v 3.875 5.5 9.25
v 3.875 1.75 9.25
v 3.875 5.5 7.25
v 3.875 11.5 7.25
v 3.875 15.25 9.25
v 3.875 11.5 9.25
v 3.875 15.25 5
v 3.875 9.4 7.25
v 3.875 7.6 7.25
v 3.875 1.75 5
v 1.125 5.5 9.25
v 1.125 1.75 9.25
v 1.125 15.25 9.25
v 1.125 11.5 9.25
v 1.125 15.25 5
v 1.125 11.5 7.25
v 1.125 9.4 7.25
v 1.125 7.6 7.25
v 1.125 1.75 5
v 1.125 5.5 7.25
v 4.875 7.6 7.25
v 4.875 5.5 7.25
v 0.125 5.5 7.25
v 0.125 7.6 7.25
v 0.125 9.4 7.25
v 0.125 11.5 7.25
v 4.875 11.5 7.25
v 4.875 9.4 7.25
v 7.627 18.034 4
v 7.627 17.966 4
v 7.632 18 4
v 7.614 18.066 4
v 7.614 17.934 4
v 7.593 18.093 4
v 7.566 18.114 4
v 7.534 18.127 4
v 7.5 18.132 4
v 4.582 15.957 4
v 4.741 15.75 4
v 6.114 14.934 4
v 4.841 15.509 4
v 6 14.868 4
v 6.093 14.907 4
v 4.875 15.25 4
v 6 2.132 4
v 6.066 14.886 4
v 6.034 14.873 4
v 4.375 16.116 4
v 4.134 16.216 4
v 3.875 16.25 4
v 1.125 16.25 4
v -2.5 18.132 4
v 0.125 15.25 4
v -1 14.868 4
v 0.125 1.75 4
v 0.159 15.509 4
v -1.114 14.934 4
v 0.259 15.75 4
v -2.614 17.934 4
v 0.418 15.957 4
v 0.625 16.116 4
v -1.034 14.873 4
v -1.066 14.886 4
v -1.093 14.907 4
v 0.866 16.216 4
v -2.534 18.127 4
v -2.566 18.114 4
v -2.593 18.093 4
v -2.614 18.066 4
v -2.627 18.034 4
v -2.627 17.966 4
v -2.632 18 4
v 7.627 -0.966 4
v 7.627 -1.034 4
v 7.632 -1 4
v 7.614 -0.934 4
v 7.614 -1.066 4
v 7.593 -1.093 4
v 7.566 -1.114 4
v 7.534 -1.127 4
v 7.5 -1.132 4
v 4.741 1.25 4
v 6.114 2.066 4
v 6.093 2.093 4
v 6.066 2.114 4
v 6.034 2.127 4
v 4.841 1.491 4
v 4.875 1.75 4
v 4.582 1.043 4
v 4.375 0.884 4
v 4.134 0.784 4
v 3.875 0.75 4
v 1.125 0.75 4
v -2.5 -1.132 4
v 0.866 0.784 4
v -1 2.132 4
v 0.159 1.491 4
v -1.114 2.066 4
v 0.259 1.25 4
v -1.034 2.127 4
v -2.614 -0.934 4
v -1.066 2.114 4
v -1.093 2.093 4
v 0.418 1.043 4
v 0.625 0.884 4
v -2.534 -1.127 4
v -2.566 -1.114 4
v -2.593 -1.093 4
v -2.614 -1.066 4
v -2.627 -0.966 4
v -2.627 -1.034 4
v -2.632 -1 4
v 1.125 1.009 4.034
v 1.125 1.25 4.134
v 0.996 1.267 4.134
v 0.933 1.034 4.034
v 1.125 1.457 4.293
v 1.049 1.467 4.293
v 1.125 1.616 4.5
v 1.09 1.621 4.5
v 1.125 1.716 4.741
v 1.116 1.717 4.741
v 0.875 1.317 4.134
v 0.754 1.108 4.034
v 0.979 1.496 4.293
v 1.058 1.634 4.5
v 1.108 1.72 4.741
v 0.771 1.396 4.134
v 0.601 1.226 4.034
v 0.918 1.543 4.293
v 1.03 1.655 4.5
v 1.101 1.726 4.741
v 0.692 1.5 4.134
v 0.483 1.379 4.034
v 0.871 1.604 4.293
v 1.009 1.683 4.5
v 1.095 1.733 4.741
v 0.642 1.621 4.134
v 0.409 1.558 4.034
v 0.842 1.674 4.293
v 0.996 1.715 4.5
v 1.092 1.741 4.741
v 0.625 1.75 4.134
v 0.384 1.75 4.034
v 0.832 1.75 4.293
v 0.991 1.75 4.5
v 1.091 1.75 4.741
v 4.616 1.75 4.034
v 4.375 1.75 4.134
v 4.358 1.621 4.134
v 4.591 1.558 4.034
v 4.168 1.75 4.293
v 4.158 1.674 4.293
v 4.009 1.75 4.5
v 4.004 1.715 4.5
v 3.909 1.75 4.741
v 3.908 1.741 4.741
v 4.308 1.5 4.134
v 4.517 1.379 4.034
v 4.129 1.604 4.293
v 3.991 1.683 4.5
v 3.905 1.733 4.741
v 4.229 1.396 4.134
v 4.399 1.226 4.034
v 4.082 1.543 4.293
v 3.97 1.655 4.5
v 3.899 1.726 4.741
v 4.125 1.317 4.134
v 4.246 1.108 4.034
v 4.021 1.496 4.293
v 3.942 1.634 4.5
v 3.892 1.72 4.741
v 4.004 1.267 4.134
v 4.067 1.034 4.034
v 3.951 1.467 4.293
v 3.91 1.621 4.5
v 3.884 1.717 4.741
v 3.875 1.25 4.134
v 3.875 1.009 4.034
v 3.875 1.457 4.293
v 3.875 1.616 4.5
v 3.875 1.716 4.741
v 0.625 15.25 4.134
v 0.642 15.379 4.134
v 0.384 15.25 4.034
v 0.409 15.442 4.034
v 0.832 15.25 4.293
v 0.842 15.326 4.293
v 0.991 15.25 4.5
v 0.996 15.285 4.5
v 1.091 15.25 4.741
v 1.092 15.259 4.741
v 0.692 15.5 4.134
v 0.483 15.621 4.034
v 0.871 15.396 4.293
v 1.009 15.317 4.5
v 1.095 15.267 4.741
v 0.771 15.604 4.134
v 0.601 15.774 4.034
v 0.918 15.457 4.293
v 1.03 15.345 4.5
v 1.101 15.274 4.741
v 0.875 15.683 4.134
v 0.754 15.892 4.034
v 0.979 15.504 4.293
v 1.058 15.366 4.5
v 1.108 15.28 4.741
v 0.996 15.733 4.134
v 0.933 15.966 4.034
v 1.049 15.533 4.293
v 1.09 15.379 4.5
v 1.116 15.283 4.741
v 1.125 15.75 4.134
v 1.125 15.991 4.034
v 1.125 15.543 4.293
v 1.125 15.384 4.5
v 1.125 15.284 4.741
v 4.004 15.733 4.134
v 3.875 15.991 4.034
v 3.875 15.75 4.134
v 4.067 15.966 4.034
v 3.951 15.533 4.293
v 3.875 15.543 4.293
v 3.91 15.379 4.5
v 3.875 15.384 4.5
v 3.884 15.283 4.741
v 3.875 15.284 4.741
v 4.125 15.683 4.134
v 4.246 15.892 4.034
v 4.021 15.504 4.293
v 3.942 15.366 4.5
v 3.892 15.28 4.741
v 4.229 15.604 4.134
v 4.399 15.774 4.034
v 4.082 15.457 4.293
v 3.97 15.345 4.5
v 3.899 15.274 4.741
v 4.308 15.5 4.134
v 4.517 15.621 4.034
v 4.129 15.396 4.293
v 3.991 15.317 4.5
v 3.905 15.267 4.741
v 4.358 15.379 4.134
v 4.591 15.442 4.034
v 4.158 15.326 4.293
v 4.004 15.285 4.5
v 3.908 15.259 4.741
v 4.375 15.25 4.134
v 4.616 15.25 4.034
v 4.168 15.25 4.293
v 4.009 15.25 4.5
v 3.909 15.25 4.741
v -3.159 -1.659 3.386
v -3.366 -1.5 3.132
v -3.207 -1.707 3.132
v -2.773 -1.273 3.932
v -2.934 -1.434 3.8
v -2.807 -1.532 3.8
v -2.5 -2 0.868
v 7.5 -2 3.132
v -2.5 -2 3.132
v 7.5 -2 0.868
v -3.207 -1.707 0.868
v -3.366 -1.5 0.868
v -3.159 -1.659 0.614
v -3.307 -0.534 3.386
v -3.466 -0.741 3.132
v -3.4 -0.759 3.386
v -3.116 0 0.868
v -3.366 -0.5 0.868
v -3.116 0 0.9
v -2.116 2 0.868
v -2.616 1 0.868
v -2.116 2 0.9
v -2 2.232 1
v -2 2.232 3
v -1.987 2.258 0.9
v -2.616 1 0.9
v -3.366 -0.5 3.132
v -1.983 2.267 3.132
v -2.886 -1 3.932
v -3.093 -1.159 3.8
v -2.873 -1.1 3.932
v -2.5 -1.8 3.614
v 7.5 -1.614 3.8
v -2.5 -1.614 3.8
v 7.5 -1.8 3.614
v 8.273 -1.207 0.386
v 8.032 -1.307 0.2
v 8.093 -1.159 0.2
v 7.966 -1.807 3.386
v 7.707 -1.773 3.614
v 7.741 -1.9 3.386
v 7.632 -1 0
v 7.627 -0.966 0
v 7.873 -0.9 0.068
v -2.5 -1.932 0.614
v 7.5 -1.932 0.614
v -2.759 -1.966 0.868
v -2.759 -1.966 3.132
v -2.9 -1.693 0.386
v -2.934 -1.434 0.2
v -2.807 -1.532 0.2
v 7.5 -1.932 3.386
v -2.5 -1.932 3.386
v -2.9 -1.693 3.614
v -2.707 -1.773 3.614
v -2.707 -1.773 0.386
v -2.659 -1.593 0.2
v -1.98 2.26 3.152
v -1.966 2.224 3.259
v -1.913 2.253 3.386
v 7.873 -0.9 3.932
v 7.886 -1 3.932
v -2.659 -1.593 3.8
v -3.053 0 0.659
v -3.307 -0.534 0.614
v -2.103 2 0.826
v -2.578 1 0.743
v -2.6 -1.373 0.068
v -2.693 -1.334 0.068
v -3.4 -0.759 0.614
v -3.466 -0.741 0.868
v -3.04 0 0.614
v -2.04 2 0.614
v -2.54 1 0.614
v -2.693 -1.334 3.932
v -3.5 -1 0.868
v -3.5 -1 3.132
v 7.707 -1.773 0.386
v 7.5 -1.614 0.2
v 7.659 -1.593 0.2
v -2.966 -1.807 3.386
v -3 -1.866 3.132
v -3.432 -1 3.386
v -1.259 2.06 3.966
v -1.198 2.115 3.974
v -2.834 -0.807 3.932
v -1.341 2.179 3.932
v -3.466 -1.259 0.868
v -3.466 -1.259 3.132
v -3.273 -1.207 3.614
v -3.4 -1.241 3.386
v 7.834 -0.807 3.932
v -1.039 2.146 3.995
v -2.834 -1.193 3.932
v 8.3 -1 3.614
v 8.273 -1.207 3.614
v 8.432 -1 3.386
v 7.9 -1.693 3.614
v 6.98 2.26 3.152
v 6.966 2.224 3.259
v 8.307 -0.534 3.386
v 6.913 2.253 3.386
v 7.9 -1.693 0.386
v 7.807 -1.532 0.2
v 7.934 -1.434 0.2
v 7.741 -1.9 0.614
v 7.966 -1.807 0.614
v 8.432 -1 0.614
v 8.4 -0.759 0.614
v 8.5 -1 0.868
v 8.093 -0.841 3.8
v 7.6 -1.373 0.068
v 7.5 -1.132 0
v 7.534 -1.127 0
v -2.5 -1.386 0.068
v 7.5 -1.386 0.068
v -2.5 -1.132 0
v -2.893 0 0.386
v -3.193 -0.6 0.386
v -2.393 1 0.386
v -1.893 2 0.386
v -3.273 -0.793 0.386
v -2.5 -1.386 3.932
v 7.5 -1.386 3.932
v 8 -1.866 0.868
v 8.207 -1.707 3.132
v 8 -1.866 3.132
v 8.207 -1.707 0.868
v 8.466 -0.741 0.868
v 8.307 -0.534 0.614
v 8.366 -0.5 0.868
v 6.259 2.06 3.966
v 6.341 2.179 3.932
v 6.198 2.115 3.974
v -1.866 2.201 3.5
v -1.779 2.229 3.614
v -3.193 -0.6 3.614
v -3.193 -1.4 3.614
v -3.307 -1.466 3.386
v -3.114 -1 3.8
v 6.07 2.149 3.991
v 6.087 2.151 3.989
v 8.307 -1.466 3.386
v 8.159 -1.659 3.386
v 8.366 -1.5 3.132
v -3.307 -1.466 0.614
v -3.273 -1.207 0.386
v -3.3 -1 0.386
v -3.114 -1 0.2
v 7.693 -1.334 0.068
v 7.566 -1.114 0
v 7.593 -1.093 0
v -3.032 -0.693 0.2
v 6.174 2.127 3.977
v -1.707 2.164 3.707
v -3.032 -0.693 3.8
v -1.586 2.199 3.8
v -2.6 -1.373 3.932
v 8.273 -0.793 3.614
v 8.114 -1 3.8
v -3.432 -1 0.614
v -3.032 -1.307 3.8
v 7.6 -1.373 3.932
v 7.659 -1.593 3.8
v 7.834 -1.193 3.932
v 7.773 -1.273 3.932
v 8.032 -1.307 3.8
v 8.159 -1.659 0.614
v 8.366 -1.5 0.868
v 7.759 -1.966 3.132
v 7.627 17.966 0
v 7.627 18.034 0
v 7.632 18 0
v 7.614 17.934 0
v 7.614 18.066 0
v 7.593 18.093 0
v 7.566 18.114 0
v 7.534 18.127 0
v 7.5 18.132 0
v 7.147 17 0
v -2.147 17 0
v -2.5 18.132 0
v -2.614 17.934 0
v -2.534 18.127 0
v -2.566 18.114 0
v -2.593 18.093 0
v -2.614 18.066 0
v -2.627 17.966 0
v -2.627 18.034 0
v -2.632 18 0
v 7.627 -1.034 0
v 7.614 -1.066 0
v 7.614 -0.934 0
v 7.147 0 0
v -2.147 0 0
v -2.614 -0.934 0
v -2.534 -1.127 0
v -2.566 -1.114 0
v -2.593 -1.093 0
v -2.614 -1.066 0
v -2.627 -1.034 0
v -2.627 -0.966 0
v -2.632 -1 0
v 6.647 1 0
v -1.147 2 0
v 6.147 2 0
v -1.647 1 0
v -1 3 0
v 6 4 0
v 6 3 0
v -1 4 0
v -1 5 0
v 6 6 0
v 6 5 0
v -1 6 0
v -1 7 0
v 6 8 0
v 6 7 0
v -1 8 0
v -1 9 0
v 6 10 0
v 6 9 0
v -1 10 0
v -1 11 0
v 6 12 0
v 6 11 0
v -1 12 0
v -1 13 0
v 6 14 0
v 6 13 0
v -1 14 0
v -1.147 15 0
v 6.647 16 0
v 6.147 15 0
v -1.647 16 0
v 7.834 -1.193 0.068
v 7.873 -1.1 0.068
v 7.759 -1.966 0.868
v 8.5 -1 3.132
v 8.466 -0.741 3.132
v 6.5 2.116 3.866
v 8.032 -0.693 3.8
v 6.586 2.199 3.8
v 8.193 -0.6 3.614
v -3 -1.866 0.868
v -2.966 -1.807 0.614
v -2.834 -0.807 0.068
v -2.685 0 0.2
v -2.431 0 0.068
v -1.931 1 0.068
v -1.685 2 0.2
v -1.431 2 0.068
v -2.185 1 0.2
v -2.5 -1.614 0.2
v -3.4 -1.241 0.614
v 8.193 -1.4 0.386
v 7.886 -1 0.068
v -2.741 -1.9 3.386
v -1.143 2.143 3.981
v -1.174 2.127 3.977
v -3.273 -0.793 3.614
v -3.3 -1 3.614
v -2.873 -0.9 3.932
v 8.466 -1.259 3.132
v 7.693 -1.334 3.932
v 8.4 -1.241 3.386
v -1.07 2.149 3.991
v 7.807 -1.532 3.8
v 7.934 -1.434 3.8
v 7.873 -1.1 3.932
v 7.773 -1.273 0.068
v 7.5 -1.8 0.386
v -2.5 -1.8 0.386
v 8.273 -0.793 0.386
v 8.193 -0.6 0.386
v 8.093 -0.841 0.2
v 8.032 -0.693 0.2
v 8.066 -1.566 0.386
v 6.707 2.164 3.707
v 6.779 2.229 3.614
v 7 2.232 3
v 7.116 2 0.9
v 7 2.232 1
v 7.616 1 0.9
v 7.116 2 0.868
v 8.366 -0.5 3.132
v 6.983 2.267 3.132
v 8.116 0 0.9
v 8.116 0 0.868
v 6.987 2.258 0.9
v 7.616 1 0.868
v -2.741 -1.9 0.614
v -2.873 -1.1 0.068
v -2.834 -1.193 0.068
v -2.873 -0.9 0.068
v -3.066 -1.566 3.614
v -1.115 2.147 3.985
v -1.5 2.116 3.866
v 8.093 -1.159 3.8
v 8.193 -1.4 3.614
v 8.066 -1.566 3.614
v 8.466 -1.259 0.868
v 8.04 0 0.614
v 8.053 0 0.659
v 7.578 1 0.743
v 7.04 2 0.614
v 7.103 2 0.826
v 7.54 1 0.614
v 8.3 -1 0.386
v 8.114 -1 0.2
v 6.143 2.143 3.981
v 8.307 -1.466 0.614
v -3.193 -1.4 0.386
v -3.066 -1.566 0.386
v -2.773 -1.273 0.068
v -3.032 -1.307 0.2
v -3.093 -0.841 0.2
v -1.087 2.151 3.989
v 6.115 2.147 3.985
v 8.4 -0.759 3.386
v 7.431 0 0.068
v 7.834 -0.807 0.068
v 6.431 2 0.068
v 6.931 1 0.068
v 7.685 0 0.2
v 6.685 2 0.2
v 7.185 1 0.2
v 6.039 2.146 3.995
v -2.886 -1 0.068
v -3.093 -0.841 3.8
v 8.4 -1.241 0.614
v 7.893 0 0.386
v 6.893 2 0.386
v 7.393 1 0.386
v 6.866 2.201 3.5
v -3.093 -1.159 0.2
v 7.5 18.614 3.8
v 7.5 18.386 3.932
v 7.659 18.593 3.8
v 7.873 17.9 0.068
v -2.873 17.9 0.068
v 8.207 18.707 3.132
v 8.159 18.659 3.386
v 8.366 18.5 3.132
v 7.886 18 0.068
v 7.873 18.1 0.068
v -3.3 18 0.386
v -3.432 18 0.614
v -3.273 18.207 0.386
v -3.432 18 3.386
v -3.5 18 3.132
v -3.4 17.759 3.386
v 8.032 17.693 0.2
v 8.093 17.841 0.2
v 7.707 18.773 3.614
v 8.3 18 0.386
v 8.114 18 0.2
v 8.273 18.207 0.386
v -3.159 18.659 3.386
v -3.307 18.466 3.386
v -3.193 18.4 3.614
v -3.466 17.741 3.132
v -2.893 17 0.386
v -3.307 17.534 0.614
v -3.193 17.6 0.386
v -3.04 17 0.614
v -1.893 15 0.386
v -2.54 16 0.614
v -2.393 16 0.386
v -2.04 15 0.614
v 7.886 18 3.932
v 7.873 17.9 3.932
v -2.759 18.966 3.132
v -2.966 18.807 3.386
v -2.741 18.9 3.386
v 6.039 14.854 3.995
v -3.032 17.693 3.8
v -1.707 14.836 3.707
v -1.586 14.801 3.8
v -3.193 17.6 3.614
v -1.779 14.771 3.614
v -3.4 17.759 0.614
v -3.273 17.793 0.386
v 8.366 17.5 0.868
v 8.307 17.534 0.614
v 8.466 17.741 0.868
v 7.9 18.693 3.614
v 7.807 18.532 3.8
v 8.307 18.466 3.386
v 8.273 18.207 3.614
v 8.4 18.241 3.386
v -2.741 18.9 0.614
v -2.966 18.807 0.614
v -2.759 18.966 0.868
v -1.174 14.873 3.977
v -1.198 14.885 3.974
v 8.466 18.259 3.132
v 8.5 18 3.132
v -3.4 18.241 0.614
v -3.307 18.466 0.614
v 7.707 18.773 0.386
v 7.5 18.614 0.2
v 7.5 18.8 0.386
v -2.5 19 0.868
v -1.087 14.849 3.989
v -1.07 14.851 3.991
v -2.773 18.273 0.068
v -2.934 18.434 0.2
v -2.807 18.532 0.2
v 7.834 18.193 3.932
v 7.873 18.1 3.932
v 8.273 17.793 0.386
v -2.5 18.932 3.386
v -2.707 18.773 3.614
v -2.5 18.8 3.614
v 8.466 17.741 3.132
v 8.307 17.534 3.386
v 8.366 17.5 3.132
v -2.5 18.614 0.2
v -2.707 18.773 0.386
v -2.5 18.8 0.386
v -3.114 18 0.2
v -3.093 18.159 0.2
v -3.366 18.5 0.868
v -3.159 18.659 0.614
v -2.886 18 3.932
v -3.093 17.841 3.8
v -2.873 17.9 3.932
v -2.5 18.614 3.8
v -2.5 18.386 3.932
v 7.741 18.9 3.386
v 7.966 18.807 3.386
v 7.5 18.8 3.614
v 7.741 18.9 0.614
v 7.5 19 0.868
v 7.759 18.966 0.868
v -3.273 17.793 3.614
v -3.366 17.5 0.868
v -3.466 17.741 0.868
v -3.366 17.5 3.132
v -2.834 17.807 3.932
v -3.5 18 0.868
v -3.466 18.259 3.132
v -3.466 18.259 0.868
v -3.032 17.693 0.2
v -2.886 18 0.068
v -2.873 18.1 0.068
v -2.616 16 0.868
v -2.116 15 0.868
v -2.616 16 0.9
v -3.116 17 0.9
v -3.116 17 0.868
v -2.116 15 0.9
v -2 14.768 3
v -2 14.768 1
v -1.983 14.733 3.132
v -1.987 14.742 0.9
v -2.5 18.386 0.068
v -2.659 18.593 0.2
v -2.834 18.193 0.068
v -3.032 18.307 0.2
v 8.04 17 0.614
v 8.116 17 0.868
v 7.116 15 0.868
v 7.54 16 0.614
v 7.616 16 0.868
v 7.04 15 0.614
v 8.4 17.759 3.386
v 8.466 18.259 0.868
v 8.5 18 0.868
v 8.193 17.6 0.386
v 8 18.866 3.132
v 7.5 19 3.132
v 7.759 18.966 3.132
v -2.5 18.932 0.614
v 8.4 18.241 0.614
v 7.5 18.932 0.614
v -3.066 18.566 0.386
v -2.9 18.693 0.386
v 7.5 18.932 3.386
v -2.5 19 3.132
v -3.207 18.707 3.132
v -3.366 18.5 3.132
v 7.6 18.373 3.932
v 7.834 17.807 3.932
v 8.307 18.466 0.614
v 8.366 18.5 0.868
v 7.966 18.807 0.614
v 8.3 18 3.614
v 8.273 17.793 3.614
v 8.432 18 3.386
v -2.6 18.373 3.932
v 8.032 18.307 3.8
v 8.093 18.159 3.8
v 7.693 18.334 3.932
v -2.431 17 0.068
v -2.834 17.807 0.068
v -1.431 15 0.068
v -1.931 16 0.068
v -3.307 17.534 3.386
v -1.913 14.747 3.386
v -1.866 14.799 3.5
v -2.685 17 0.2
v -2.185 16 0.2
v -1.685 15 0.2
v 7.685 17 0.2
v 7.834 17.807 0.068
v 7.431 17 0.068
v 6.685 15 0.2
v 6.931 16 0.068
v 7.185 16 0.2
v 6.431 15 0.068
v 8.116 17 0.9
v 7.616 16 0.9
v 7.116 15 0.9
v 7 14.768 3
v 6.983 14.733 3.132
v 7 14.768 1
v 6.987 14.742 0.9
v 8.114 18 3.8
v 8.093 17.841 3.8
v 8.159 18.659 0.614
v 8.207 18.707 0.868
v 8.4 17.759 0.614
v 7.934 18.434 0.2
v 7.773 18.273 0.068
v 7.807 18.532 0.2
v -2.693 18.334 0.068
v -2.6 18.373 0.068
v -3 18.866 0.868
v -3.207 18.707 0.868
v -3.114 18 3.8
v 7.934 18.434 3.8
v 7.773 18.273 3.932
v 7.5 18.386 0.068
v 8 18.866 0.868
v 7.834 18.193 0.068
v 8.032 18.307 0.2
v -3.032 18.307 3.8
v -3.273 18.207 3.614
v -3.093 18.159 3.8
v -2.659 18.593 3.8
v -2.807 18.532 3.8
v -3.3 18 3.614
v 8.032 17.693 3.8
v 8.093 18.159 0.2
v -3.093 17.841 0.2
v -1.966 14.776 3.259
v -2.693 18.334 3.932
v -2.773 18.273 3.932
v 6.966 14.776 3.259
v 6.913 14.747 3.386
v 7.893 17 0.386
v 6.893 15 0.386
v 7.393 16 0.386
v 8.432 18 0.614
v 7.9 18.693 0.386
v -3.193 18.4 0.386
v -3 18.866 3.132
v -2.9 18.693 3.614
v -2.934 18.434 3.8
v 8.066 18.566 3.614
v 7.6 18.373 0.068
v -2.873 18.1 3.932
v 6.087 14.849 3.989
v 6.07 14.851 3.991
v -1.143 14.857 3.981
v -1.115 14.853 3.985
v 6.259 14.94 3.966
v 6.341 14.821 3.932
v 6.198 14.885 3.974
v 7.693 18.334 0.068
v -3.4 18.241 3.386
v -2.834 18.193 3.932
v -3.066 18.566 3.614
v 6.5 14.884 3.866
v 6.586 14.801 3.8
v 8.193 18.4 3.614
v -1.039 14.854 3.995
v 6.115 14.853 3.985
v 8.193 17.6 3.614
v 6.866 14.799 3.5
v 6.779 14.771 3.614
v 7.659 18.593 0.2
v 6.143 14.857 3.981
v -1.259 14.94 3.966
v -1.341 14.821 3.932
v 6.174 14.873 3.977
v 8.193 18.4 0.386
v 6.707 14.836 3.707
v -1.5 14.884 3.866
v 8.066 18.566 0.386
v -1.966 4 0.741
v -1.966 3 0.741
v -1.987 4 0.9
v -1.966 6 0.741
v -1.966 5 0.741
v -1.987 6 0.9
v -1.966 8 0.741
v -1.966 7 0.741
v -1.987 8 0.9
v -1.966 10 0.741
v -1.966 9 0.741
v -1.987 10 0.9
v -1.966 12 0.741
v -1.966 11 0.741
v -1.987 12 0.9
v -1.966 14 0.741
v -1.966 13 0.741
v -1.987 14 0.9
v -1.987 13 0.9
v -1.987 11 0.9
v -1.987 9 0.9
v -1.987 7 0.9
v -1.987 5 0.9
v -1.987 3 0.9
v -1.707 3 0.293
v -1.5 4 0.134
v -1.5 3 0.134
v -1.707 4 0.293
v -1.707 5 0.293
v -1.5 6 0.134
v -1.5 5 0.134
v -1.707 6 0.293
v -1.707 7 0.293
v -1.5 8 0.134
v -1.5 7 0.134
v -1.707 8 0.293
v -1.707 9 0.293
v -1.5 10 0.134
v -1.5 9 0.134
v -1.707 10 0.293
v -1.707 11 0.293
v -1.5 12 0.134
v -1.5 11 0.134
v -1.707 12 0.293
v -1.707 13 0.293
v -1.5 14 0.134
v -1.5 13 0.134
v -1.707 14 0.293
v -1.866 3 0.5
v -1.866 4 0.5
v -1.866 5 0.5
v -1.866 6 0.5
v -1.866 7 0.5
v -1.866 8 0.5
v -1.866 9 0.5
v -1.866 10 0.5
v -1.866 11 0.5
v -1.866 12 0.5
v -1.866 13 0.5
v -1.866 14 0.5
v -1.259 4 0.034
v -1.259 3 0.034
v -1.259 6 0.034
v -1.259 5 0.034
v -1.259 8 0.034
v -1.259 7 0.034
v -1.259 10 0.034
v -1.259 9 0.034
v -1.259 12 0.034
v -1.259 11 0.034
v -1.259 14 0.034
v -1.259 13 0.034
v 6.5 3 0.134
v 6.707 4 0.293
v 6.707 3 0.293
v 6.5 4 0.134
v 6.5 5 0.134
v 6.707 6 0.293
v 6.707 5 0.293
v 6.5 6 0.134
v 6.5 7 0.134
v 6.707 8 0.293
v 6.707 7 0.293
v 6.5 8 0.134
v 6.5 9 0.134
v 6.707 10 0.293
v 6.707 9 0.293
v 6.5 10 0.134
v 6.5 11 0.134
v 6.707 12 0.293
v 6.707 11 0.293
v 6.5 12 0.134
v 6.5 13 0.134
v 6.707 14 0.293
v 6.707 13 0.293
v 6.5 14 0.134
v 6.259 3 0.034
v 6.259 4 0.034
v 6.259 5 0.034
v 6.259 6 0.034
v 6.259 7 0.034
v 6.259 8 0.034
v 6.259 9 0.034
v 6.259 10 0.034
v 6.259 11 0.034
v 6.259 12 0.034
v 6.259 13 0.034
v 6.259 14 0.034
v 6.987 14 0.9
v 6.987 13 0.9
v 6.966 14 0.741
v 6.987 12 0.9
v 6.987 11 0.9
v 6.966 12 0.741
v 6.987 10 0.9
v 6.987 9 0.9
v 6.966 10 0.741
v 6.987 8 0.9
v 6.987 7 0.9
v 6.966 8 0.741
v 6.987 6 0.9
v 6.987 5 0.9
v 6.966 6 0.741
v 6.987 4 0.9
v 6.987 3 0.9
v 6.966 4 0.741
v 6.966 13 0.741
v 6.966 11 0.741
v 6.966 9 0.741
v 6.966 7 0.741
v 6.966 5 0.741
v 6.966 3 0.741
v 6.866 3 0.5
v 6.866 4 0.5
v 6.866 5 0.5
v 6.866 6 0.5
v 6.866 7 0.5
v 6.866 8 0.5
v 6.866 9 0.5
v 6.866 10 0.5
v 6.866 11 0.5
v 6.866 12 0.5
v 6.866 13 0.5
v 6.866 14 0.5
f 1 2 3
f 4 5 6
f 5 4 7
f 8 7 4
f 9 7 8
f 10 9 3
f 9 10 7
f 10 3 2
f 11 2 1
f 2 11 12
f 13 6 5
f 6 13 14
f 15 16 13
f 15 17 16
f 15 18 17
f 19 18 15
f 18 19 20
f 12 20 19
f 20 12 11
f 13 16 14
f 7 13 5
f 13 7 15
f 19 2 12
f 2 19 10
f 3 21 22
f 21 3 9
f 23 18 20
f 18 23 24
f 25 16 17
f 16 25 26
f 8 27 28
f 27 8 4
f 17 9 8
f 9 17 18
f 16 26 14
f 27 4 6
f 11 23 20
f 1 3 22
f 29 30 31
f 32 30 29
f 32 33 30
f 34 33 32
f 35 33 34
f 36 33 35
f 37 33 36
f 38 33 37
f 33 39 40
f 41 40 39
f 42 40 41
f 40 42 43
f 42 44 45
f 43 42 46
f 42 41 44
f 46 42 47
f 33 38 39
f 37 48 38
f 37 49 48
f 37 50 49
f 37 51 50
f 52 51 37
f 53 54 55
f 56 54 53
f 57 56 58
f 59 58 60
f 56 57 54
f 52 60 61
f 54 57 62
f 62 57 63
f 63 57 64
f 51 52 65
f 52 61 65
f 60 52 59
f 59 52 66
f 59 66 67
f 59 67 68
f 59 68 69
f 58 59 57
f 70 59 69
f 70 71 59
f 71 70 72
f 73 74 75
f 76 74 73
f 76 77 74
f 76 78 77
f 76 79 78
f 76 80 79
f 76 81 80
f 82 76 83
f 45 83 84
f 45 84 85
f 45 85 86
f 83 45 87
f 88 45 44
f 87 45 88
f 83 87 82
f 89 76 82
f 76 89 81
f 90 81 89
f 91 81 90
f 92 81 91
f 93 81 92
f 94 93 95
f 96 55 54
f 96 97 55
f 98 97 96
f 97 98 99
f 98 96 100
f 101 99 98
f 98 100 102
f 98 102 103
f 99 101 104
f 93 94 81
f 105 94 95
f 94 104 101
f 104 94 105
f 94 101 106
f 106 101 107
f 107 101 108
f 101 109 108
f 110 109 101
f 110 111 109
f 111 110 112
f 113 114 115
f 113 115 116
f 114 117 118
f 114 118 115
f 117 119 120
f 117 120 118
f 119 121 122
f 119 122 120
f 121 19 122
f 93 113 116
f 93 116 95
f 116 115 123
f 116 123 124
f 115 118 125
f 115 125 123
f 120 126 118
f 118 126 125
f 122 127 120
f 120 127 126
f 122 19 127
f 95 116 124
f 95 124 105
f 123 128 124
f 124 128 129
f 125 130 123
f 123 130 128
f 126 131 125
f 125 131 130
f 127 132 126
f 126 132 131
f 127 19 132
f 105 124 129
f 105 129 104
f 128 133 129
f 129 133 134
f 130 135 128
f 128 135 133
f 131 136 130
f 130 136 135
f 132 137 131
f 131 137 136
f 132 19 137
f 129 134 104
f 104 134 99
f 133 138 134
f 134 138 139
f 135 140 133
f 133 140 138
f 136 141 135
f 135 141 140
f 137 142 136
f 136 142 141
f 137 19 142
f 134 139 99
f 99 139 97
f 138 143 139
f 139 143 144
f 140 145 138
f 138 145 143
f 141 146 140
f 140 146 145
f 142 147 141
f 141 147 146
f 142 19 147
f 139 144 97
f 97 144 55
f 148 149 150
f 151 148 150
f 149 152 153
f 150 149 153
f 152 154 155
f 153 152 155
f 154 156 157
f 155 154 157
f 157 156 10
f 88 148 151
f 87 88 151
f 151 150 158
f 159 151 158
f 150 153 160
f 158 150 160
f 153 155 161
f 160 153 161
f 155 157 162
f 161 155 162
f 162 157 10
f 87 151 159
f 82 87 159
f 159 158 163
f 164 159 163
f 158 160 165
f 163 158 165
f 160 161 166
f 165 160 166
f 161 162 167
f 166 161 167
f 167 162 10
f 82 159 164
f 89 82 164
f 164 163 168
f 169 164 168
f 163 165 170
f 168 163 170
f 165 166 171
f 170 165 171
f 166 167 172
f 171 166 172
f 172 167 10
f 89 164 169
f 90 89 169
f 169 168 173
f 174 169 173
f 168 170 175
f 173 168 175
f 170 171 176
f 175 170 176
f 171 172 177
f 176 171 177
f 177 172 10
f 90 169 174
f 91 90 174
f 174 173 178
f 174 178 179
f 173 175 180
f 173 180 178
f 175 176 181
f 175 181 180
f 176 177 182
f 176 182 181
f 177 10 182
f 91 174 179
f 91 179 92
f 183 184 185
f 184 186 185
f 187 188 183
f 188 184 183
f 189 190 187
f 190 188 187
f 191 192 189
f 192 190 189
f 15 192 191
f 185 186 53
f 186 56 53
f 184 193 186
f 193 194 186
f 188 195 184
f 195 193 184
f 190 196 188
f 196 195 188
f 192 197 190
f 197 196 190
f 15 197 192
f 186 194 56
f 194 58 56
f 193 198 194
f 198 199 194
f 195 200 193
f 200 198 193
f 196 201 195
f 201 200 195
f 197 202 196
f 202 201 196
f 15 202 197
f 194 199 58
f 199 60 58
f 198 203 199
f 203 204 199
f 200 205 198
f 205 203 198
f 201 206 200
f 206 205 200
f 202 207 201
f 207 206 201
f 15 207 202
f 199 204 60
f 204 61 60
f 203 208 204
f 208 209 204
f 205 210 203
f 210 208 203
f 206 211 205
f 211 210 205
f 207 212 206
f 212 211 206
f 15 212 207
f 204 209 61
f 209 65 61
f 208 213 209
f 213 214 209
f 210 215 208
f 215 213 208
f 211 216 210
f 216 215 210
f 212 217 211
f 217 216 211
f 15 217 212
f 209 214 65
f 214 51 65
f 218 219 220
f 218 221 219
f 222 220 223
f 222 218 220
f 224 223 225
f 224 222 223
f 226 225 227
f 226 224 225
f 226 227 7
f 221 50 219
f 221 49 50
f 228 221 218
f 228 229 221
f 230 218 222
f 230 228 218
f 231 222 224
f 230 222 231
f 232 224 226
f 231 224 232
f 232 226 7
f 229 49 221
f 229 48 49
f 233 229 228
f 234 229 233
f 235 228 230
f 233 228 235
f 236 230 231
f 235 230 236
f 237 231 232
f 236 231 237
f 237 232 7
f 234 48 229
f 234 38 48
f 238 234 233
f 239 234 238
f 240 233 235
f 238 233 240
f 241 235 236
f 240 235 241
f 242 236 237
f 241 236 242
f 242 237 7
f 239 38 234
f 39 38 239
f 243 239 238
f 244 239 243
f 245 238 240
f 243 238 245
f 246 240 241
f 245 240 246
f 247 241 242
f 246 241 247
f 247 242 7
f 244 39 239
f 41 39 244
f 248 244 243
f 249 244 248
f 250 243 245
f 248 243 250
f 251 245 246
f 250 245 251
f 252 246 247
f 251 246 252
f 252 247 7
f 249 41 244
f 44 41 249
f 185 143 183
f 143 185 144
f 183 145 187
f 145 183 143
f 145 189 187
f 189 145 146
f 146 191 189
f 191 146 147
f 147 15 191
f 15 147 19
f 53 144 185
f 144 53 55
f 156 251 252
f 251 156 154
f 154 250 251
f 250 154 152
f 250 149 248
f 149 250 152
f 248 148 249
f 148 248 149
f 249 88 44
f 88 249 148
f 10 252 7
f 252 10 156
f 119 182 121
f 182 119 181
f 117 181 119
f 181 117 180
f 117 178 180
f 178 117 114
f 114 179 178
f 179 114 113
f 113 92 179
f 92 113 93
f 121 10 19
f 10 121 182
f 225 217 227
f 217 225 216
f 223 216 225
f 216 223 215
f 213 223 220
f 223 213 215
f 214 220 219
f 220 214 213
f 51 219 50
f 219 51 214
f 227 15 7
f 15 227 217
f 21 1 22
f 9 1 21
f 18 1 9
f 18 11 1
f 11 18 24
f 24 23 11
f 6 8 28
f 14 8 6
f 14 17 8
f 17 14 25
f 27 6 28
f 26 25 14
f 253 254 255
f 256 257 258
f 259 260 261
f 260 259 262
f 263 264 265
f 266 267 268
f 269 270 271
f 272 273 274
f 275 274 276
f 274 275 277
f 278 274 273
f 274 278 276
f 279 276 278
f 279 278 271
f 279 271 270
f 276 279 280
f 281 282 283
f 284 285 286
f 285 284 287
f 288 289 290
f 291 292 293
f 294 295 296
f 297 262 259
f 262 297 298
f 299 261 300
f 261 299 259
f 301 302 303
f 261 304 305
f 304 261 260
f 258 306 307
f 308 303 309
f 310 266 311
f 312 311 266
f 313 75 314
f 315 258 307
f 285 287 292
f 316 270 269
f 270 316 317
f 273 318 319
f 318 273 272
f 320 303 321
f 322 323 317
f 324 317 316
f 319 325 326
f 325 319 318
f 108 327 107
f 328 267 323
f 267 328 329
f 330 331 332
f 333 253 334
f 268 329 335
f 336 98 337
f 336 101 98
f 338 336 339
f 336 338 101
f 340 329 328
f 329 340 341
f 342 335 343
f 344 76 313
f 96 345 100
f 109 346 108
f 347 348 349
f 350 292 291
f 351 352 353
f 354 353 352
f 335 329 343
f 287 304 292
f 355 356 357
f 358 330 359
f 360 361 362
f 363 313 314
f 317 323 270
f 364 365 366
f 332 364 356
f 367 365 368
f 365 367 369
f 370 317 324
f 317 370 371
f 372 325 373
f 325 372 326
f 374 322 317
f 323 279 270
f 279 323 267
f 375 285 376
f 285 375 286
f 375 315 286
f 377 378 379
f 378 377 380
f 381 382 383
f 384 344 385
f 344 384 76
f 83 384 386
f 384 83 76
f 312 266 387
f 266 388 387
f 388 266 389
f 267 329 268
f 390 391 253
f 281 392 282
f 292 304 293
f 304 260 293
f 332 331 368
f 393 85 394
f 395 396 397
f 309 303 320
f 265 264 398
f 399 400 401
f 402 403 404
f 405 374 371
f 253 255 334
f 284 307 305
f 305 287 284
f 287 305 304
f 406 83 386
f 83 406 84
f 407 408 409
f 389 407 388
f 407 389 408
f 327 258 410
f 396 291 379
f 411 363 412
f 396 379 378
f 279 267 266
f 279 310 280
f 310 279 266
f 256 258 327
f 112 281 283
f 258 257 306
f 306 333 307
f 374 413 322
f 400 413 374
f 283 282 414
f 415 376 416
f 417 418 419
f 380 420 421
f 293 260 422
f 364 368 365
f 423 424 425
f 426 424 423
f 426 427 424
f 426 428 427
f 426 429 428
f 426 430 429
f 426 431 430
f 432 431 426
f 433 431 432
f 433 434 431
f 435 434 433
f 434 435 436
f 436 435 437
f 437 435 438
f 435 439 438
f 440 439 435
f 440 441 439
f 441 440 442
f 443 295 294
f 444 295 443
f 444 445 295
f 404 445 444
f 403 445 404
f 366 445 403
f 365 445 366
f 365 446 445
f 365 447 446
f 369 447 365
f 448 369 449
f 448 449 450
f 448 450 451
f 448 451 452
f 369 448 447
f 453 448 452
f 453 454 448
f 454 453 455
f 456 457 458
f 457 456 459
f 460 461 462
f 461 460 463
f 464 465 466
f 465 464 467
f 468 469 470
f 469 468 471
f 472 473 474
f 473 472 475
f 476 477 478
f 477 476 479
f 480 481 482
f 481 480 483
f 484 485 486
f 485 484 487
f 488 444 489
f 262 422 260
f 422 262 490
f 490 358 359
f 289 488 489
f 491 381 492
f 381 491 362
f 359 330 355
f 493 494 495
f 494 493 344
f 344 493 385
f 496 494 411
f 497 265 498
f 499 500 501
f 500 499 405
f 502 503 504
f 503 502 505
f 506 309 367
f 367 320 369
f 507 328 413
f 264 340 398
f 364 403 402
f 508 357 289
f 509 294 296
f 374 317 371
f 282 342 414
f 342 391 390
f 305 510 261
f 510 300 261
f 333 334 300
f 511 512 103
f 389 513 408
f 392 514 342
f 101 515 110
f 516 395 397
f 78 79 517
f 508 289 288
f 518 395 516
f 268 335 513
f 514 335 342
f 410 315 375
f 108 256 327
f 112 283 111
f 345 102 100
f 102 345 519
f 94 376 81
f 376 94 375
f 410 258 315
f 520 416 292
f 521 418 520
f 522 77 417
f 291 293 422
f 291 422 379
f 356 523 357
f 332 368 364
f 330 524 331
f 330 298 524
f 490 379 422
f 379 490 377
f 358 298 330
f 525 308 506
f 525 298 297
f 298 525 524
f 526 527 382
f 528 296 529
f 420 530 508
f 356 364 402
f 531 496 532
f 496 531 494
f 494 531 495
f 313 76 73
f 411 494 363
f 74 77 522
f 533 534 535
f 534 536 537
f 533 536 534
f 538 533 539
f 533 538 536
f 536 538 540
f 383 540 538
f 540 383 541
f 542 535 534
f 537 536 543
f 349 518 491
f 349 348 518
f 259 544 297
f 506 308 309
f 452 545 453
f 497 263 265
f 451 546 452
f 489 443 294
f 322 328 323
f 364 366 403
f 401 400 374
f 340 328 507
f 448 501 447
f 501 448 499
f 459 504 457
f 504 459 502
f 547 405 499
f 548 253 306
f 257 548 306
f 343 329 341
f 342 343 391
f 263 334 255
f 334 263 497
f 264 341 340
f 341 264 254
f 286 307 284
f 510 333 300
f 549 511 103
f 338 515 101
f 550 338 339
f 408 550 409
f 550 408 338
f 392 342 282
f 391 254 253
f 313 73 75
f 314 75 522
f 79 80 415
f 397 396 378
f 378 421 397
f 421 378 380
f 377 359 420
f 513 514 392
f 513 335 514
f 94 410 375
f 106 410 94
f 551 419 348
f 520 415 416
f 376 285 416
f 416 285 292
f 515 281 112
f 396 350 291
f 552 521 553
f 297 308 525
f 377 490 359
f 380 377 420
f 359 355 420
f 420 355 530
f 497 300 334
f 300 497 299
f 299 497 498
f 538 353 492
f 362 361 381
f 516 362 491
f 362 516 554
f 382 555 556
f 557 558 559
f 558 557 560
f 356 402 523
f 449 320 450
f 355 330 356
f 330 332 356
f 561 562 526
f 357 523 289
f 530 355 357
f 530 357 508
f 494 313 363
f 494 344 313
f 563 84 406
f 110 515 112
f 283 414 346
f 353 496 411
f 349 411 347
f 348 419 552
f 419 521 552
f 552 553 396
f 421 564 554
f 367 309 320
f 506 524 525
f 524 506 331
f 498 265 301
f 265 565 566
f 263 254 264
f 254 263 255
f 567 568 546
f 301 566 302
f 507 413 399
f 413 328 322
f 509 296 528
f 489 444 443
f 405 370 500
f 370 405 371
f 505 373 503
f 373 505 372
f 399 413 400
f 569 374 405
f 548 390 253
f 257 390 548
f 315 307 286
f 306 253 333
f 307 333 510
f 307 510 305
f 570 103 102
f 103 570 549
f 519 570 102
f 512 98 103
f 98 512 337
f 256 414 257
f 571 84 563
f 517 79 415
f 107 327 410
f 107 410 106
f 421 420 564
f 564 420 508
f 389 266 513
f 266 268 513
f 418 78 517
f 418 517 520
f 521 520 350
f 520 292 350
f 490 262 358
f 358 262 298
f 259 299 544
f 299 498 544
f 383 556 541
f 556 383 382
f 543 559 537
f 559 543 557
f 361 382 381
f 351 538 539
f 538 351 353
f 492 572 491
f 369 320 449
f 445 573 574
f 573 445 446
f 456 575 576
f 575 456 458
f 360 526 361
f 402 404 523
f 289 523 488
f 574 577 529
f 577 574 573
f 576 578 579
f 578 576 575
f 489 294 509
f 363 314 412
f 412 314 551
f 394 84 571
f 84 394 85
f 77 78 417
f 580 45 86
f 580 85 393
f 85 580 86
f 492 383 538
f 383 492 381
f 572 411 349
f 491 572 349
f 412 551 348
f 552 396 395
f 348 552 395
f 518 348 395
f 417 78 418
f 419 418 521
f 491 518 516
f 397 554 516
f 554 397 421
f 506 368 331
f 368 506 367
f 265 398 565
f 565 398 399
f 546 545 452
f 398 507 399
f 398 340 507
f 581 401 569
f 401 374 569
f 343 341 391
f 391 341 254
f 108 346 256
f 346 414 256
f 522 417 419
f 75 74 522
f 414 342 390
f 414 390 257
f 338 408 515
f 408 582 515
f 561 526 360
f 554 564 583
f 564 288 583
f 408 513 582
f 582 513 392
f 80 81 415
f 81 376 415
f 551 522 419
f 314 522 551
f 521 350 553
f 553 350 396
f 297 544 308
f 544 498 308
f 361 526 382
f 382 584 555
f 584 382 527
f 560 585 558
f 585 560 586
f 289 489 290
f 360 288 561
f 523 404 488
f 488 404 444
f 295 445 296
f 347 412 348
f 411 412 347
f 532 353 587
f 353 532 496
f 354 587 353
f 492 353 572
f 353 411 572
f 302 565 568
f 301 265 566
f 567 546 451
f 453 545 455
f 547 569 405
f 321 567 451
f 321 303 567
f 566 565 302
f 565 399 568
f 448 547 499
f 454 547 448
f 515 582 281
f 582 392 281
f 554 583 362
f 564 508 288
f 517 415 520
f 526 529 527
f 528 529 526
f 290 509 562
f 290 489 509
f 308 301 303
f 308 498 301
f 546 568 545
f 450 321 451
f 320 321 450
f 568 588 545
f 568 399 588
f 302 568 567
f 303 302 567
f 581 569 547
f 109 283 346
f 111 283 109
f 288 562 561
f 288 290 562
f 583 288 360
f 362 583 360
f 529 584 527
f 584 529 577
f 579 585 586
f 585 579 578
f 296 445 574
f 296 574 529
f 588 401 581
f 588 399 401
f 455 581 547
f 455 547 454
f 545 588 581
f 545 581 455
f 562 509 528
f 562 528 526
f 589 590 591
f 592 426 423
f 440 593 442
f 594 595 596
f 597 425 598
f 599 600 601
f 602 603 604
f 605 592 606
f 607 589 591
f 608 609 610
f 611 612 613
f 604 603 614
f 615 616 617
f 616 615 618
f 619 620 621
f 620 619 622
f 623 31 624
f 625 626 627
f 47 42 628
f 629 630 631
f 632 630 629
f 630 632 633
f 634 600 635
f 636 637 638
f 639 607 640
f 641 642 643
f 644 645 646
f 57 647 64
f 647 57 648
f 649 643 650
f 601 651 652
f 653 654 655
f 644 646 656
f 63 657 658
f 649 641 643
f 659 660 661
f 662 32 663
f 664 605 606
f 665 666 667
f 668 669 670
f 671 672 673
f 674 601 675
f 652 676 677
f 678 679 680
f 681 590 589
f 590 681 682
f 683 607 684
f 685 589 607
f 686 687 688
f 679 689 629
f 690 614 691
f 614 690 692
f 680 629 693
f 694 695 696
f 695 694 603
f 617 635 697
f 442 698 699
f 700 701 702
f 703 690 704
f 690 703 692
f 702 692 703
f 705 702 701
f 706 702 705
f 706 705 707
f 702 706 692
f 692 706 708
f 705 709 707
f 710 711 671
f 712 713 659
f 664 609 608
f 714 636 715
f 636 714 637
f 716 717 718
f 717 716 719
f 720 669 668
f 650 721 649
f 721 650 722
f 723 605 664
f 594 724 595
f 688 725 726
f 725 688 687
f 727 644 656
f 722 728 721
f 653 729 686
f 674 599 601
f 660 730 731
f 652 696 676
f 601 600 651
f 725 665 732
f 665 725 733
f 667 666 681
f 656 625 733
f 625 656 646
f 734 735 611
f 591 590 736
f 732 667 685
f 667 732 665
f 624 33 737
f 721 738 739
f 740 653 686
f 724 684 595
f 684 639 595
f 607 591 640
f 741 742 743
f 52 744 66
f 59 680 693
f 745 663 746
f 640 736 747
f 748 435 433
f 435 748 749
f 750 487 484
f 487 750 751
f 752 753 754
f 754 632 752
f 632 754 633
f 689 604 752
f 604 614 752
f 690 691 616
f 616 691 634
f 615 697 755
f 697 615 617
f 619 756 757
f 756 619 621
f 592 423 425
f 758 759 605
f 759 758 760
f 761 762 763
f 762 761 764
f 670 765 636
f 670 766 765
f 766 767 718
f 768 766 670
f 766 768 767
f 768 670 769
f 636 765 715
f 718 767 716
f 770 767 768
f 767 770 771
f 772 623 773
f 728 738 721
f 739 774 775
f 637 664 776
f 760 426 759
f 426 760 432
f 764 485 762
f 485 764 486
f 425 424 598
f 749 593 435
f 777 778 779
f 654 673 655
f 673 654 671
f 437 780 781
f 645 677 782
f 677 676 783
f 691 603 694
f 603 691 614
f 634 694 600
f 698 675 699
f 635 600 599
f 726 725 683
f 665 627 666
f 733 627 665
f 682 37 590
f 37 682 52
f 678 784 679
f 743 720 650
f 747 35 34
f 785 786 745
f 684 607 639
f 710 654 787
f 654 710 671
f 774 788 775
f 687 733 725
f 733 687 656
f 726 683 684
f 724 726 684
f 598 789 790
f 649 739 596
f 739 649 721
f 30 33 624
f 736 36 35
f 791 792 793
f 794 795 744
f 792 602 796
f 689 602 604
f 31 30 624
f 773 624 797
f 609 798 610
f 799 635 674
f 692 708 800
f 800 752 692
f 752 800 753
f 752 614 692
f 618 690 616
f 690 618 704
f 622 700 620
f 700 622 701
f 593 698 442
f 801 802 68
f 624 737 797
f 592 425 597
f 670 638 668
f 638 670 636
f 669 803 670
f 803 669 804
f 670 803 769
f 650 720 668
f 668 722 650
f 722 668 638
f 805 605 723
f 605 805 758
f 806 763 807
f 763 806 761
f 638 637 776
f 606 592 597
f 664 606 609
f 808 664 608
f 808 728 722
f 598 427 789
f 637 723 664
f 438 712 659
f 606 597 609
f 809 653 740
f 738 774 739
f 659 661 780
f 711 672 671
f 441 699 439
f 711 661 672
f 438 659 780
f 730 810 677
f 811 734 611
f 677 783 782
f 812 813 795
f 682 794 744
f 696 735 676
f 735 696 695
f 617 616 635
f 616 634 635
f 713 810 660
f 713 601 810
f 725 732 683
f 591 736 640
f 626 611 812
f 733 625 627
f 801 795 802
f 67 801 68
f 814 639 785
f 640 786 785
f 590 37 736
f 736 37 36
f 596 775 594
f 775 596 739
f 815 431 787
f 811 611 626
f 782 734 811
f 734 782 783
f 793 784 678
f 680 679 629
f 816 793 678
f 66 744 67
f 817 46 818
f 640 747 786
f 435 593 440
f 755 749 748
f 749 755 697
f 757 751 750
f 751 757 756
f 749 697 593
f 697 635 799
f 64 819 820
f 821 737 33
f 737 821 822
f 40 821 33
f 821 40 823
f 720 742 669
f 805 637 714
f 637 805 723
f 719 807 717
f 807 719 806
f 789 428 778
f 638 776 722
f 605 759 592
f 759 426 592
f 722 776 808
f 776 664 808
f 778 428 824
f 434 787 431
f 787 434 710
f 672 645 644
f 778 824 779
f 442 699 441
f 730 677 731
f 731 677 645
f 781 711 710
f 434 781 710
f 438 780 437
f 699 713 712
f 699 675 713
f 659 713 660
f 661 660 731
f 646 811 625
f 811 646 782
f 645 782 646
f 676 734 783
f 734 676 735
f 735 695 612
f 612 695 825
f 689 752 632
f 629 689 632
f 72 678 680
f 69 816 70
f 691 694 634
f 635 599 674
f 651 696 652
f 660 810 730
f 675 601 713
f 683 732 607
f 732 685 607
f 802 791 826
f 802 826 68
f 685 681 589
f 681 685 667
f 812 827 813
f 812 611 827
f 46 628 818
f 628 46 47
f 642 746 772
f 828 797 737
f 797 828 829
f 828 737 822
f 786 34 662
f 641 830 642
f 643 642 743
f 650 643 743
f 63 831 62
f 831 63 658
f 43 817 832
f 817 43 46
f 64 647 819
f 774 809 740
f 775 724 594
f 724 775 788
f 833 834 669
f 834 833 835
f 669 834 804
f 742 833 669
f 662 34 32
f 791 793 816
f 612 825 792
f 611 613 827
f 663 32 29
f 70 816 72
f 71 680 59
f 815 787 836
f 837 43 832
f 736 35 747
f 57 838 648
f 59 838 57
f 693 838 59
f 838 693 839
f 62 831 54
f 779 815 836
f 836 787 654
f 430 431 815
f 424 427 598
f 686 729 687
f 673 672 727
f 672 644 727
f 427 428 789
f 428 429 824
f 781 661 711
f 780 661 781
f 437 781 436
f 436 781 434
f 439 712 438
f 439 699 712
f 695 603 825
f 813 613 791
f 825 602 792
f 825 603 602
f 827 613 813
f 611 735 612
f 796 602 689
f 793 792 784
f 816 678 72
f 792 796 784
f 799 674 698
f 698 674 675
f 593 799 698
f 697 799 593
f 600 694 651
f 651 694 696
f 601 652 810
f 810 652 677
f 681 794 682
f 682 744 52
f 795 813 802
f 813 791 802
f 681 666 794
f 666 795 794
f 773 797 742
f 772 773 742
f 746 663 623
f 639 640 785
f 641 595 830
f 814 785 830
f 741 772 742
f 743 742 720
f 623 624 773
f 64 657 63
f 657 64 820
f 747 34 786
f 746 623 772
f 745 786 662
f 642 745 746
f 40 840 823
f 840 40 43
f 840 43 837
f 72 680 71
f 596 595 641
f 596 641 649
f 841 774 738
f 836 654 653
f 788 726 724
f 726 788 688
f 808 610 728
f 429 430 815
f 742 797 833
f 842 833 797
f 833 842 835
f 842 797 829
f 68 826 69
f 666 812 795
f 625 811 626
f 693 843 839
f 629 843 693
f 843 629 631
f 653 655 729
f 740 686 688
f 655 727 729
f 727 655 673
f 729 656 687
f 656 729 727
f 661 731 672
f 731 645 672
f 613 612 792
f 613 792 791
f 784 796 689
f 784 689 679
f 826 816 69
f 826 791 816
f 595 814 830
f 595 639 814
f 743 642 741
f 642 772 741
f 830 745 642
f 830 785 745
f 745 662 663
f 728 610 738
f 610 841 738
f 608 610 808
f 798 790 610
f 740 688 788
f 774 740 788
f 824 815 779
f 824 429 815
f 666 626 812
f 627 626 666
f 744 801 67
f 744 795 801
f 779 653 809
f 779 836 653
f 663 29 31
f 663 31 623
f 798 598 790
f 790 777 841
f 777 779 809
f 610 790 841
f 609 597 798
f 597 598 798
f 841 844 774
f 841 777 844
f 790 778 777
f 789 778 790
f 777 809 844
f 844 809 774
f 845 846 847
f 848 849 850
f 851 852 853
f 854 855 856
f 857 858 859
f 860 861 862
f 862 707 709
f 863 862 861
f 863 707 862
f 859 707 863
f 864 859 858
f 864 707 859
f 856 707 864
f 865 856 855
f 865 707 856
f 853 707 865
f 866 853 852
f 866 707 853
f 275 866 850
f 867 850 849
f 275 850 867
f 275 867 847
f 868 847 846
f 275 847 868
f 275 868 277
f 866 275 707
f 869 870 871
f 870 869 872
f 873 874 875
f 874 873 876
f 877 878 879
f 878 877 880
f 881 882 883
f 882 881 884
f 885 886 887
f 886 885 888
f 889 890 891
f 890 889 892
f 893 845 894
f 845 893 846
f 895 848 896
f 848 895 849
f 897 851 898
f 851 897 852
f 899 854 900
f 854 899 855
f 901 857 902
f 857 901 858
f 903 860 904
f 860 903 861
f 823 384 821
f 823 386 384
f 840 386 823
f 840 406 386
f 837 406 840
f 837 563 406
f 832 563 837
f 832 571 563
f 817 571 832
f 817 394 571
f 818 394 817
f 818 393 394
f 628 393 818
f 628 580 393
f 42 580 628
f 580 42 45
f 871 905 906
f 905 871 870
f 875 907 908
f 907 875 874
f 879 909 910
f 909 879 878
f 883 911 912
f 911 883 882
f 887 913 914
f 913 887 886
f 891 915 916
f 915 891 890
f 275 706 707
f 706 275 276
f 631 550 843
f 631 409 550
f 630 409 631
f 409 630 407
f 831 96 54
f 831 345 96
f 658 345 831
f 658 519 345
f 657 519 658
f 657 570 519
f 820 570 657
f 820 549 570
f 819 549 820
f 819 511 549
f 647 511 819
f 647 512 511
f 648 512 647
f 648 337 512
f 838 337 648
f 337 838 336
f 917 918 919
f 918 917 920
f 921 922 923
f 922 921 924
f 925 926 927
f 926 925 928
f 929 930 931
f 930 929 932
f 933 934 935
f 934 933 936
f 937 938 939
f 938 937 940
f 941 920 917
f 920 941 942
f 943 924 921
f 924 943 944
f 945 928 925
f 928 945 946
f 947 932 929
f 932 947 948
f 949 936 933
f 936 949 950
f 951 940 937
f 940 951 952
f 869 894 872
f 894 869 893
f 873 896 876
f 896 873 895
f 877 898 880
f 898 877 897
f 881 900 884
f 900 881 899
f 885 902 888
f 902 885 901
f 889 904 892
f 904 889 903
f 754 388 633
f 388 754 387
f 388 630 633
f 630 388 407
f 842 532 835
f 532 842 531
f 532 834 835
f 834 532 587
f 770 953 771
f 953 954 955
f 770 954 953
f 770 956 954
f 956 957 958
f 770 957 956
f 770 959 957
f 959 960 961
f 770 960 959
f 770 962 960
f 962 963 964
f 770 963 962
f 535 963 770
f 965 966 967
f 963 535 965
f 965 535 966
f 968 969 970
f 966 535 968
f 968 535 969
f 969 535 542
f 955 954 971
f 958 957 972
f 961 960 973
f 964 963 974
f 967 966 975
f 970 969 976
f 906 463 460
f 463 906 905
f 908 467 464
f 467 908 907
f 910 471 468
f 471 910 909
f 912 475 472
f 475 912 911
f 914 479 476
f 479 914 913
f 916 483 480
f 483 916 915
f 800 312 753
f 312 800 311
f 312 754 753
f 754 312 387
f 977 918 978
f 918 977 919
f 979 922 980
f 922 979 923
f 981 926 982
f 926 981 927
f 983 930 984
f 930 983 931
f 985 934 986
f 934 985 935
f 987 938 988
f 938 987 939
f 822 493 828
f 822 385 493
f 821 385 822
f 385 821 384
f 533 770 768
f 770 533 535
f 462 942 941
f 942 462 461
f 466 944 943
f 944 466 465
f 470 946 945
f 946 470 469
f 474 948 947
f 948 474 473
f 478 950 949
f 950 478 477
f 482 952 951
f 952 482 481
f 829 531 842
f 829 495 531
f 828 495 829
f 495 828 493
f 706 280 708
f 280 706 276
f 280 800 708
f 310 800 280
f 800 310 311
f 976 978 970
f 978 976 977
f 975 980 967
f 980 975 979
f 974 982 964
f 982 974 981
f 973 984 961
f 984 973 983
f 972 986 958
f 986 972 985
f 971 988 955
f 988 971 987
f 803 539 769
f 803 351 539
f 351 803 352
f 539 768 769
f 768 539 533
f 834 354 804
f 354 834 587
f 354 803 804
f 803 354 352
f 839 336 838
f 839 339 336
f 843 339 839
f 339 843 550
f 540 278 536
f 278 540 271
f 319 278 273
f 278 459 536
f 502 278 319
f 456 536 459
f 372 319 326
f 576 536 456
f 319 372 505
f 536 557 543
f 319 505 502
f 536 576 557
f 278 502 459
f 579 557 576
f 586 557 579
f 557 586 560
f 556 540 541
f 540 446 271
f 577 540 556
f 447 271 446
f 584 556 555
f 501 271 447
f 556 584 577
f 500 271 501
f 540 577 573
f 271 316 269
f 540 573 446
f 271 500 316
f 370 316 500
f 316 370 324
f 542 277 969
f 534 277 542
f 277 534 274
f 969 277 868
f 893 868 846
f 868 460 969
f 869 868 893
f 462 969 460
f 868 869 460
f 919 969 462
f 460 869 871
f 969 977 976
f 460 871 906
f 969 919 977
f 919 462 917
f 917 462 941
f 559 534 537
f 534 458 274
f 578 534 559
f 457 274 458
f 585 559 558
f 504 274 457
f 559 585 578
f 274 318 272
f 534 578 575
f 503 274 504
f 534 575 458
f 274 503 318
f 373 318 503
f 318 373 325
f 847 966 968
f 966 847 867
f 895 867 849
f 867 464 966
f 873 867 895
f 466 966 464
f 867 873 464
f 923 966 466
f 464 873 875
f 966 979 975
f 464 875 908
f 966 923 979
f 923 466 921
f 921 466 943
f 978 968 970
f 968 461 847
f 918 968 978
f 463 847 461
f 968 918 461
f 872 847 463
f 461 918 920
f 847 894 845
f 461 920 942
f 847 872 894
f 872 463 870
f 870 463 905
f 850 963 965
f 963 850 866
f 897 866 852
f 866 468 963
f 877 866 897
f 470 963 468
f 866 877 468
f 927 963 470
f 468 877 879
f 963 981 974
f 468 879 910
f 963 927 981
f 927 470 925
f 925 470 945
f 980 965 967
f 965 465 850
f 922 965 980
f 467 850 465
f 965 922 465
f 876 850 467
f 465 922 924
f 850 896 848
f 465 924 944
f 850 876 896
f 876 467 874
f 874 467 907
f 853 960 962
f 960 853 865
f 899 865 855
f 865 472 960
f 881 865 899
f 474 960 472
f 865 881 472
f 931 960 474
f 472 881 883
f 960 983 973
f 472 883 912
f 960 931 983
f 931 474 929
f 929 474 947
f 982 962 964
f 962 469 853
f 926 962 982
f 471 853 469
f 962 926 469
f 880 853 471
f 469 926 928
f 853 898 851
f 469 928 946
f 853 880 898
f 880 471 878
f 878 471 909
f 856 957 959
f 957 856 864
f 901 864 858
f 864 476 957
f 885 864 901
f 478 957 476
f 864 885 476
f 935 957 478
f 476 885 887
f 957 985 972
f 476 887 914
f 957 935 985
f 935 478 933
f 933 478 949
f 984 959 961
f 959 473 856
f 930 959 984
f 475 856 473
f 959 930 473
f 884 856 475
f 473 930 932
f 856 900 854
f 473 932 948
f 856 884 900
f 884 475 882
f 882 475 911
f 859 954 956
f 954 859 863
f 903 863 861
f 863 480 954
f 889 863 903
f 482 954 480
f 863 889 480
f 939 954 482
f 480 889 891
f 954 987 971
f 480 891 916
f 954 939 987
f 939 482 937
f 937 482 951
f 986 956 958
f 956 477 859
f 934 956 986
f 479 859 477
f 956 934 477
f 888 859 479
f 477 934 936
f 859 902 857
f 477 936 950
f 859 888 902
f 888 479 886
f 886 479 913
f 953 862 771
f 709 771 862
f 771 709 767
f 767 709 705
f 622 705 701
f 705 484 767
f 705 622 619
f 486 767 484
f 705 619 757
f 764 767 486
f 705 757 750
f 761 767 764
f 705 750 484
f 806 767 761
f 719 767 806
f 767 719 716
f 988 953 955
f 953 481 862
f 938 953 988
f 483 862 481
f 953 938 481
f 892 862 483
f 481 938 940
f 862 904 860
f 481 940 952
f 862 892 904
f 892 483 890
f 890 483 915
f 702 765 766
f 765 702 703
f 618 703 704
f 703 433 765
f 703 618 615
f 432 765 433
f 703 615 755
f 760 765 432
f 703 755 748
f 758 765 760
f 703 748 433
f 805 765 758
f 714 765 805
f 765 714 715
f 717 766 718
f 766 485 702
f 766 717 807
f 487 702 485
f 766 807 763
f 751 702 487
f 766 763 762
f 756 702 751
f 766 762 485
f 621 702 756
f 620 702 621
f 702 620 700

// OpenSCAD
/*
*	olfa-l5-al.scad by cgsnz @ Thingiverse
*
*	Replacement thumbgrip for olfa-l5-al box cutter knife
*
* This work is licensed under the Creative Commons Attribution-ShareAlike 4.0 International License. To view a copy of this license, visit http://creativecommons.org/licenses/by-sa/4.0/ or send a letter to Creative Commons, PO Box 1866, Mountain View, CA 94042, USA.
*
*/

/*[ Main Settings ]*/
// Fragments
$fn=24;//[24:low,48:med,96:high]
// Inner Body Width
TW = 9;//[6:15]
// End Body Width
TW2 = 12;//[6:18]
// Total Length
TL = 17;//[14:30]
// End Body Depth
TE = 3;//[1:10]
// Thickness
TT = 4;//[3:7]
// Groove Depth
TGD = 0.9;
// Groove Width
TGW = 1;
// Center Catch Width - exagerated because of bottom being printed into thin air, real width = 3.6
CCW = 4.75;

// center insert params

IL = 0+13.5;
IW = 0+2.75;
IH = 0+4.25;
CL = 0+6;
CF = 0+1.8;
CD = 0+2;

IH2 = IH+TT/2;
CO = IL-CL;
CFO = CL-CF;
CBO = CCW-IW;
TWO = (TW2-TW)/2;

translate([(TW-TT-IW)/2,(TL-IL)/2,TT*.75]) insert();
difference() {
	thumbgrip();
	groves();
}

module groves() {
	g = floor((TL+TT/4)/TGW);
	w = (g%2)?0:TGW/2;
	o = (TL-g*TGW)/2;
	to = TW2>TW?TWO:0;
	for (i = [0 : 2 : g-1]) {
	 translate([-to-TT/2-.1,w+o+i*TGW,-.1]) cube([max(TW,TW2)+.2,TGW,TGD+.1]);
	}
}

module thumbgrip() {
	tt = TT/cos(180/$fn);
	hull() {
		translate([-TT/4,-TT/4+TE,TT*.75]) sphere(tt/4);
		translate([-TWO-TT/4,-TT/4,TT*.75]) sphere(tt/4);
		translate([(TW-TT)+TT/4,-TT/4+TE,TT*.75]) sphere(tt/4);
		translate([TWO+(TW-TT)+TT/4,-TT/4,TT*.75]) sphere(tt/4);
		translate([-TT/4,-TT/4+TE,TT/4]) sphere(tt/4);
		translate([-TWO-TT/4,-TT/4,TT/4]) sphere(tt/4);
		translate([(TW-TT)+TT/4,-TT/4+TE,TT/4]) sphere(tt/4);
		translate([TWO+(TW-TT)+TT/4,-TT/4,TT/4]) sphere(tt/4);
	}
	hull() {
		translate([-TT/4,TL+TT/4-TE,TT*.75]) sphere(tt/4);
		translate([-TWO-TT/4,TL+TT/4,TT*.75]) sphere(tt/4);
		translate([(TW-TT)+TT/4,TL+TT/4-TE,TT*.75]) sphere(tt/4);
		translate([TWO+(TW-TT)+TT/4,TL+TT/4,TT*.75]) sphere(tt/4);
		translate([-TT/4,TL+TT/4-TE,TT/4]) sphere(tt/4);
		translate([-TWO-TT/4,TL+TT/4,TT/4]) sphere(tt/4);
		translate([(TW-TT)+TT/4,TL+TT/4-TE,TT/4]) sphere(tt/4);
		translate([TWO+(TW-TT)+TT/4,TL+TT/4,TT/4]) sphere(tt/4);
	}
	hull() {
		translate([-TT/4,TE-TT/4,TT/4]) rotate([-90,0,0]) cylinder(h=TL-TE*2+TT/2,r=TT/4);
		translate([-TT/4,TE-TT/4,TT-TT/4]) rotate([-90,0,0]) cylinder(h=TL-TE*2+TT/2,r=TT/4);
		translate([TW-TT*.75,TE-TT/4,TT/4]) rotate([-90,0,0]) cylinder(h=TL-TE*2+TT/2,r=TT/4);
		translate([TW-TT*.75,TE-TT/4,TT-TT/4]) rotate([-90,0,0]) cylinder(h=TL-TE*2+TT/2,r=TT/4);
	}
}

module insert() {
	difference() {
		cube([IW,IL,IH2]);
		translate([-.5,CO/2,IH2-CD]) cube([IW+1,CL,CD+.1]);
	}
	union() {
		translate([0,0,TT/4]) cfillet(TT/4);
		translate([IW,0,TT/4]) cfillet(TT/4);
		translate([0,IL,TT/4]) cfillet(TT/4);
		translate([IW,IL,TT/4]) cfillet(TT/4);
		translate([0,0,TT/4]) rotate([90,0,180]) fillet(TT/4,IL);
		translate([IW,0,TT/4]) rotate([-90,-90,0]) fillet(TT/4,IL);
		translate([0,0,TT/4]) rotate([0,-90,180]) fillet(TT/4,IW);
		translate([IW,IL,TT/4]) rotate([0,-90,0]) fillet(TT/4,IW);
	}
	polyhedron(
  points = [
		[-CBO/2, CO/2, IH2-CD],[IW+CBO/2, CO/2, IH2-CD],
		[0, CO/2, IH2],[IW, CO/2, IH2],
		[-CBO/2, (CO+CFO)/2, IH2-CD],[IW+CBO/2, (CO+CFO)/2, IH2-CD],
  ],
  faces = [[2,3,1,0],[0,4,2],[1,3,5],[3,2,4,5],[0,1,5,4]]);
	polyhedron(
  points = [
		[-CBO/2, IL-CO/2, IH2-CD],[IW+CBO/2, IL-CO/2, IH2-CD],
		[0, IL-CO/2, IH2],[IW, IL-CO/2, IH2],
		[-CBO/2, IL-(CO+CFO)/2, IH2-CD],[IW+CBO/2, IL-(CO+CFO)/2, IH2-CD],
  ],
  faces = [[0,1,3,2],[2,4,0],[5,3,1],[5,4,2,3],[4,5,1,0]]);

}

module cfillet(t) {
	rotate_extrude() difference() {
		square(t);
		translate([t,t]) circle(t);
	}
}

module fillet(t,h) {
	linear_extrude(height=h) difference() {
		square(t);
		translate([t,t]) circle(t);
	}
}
